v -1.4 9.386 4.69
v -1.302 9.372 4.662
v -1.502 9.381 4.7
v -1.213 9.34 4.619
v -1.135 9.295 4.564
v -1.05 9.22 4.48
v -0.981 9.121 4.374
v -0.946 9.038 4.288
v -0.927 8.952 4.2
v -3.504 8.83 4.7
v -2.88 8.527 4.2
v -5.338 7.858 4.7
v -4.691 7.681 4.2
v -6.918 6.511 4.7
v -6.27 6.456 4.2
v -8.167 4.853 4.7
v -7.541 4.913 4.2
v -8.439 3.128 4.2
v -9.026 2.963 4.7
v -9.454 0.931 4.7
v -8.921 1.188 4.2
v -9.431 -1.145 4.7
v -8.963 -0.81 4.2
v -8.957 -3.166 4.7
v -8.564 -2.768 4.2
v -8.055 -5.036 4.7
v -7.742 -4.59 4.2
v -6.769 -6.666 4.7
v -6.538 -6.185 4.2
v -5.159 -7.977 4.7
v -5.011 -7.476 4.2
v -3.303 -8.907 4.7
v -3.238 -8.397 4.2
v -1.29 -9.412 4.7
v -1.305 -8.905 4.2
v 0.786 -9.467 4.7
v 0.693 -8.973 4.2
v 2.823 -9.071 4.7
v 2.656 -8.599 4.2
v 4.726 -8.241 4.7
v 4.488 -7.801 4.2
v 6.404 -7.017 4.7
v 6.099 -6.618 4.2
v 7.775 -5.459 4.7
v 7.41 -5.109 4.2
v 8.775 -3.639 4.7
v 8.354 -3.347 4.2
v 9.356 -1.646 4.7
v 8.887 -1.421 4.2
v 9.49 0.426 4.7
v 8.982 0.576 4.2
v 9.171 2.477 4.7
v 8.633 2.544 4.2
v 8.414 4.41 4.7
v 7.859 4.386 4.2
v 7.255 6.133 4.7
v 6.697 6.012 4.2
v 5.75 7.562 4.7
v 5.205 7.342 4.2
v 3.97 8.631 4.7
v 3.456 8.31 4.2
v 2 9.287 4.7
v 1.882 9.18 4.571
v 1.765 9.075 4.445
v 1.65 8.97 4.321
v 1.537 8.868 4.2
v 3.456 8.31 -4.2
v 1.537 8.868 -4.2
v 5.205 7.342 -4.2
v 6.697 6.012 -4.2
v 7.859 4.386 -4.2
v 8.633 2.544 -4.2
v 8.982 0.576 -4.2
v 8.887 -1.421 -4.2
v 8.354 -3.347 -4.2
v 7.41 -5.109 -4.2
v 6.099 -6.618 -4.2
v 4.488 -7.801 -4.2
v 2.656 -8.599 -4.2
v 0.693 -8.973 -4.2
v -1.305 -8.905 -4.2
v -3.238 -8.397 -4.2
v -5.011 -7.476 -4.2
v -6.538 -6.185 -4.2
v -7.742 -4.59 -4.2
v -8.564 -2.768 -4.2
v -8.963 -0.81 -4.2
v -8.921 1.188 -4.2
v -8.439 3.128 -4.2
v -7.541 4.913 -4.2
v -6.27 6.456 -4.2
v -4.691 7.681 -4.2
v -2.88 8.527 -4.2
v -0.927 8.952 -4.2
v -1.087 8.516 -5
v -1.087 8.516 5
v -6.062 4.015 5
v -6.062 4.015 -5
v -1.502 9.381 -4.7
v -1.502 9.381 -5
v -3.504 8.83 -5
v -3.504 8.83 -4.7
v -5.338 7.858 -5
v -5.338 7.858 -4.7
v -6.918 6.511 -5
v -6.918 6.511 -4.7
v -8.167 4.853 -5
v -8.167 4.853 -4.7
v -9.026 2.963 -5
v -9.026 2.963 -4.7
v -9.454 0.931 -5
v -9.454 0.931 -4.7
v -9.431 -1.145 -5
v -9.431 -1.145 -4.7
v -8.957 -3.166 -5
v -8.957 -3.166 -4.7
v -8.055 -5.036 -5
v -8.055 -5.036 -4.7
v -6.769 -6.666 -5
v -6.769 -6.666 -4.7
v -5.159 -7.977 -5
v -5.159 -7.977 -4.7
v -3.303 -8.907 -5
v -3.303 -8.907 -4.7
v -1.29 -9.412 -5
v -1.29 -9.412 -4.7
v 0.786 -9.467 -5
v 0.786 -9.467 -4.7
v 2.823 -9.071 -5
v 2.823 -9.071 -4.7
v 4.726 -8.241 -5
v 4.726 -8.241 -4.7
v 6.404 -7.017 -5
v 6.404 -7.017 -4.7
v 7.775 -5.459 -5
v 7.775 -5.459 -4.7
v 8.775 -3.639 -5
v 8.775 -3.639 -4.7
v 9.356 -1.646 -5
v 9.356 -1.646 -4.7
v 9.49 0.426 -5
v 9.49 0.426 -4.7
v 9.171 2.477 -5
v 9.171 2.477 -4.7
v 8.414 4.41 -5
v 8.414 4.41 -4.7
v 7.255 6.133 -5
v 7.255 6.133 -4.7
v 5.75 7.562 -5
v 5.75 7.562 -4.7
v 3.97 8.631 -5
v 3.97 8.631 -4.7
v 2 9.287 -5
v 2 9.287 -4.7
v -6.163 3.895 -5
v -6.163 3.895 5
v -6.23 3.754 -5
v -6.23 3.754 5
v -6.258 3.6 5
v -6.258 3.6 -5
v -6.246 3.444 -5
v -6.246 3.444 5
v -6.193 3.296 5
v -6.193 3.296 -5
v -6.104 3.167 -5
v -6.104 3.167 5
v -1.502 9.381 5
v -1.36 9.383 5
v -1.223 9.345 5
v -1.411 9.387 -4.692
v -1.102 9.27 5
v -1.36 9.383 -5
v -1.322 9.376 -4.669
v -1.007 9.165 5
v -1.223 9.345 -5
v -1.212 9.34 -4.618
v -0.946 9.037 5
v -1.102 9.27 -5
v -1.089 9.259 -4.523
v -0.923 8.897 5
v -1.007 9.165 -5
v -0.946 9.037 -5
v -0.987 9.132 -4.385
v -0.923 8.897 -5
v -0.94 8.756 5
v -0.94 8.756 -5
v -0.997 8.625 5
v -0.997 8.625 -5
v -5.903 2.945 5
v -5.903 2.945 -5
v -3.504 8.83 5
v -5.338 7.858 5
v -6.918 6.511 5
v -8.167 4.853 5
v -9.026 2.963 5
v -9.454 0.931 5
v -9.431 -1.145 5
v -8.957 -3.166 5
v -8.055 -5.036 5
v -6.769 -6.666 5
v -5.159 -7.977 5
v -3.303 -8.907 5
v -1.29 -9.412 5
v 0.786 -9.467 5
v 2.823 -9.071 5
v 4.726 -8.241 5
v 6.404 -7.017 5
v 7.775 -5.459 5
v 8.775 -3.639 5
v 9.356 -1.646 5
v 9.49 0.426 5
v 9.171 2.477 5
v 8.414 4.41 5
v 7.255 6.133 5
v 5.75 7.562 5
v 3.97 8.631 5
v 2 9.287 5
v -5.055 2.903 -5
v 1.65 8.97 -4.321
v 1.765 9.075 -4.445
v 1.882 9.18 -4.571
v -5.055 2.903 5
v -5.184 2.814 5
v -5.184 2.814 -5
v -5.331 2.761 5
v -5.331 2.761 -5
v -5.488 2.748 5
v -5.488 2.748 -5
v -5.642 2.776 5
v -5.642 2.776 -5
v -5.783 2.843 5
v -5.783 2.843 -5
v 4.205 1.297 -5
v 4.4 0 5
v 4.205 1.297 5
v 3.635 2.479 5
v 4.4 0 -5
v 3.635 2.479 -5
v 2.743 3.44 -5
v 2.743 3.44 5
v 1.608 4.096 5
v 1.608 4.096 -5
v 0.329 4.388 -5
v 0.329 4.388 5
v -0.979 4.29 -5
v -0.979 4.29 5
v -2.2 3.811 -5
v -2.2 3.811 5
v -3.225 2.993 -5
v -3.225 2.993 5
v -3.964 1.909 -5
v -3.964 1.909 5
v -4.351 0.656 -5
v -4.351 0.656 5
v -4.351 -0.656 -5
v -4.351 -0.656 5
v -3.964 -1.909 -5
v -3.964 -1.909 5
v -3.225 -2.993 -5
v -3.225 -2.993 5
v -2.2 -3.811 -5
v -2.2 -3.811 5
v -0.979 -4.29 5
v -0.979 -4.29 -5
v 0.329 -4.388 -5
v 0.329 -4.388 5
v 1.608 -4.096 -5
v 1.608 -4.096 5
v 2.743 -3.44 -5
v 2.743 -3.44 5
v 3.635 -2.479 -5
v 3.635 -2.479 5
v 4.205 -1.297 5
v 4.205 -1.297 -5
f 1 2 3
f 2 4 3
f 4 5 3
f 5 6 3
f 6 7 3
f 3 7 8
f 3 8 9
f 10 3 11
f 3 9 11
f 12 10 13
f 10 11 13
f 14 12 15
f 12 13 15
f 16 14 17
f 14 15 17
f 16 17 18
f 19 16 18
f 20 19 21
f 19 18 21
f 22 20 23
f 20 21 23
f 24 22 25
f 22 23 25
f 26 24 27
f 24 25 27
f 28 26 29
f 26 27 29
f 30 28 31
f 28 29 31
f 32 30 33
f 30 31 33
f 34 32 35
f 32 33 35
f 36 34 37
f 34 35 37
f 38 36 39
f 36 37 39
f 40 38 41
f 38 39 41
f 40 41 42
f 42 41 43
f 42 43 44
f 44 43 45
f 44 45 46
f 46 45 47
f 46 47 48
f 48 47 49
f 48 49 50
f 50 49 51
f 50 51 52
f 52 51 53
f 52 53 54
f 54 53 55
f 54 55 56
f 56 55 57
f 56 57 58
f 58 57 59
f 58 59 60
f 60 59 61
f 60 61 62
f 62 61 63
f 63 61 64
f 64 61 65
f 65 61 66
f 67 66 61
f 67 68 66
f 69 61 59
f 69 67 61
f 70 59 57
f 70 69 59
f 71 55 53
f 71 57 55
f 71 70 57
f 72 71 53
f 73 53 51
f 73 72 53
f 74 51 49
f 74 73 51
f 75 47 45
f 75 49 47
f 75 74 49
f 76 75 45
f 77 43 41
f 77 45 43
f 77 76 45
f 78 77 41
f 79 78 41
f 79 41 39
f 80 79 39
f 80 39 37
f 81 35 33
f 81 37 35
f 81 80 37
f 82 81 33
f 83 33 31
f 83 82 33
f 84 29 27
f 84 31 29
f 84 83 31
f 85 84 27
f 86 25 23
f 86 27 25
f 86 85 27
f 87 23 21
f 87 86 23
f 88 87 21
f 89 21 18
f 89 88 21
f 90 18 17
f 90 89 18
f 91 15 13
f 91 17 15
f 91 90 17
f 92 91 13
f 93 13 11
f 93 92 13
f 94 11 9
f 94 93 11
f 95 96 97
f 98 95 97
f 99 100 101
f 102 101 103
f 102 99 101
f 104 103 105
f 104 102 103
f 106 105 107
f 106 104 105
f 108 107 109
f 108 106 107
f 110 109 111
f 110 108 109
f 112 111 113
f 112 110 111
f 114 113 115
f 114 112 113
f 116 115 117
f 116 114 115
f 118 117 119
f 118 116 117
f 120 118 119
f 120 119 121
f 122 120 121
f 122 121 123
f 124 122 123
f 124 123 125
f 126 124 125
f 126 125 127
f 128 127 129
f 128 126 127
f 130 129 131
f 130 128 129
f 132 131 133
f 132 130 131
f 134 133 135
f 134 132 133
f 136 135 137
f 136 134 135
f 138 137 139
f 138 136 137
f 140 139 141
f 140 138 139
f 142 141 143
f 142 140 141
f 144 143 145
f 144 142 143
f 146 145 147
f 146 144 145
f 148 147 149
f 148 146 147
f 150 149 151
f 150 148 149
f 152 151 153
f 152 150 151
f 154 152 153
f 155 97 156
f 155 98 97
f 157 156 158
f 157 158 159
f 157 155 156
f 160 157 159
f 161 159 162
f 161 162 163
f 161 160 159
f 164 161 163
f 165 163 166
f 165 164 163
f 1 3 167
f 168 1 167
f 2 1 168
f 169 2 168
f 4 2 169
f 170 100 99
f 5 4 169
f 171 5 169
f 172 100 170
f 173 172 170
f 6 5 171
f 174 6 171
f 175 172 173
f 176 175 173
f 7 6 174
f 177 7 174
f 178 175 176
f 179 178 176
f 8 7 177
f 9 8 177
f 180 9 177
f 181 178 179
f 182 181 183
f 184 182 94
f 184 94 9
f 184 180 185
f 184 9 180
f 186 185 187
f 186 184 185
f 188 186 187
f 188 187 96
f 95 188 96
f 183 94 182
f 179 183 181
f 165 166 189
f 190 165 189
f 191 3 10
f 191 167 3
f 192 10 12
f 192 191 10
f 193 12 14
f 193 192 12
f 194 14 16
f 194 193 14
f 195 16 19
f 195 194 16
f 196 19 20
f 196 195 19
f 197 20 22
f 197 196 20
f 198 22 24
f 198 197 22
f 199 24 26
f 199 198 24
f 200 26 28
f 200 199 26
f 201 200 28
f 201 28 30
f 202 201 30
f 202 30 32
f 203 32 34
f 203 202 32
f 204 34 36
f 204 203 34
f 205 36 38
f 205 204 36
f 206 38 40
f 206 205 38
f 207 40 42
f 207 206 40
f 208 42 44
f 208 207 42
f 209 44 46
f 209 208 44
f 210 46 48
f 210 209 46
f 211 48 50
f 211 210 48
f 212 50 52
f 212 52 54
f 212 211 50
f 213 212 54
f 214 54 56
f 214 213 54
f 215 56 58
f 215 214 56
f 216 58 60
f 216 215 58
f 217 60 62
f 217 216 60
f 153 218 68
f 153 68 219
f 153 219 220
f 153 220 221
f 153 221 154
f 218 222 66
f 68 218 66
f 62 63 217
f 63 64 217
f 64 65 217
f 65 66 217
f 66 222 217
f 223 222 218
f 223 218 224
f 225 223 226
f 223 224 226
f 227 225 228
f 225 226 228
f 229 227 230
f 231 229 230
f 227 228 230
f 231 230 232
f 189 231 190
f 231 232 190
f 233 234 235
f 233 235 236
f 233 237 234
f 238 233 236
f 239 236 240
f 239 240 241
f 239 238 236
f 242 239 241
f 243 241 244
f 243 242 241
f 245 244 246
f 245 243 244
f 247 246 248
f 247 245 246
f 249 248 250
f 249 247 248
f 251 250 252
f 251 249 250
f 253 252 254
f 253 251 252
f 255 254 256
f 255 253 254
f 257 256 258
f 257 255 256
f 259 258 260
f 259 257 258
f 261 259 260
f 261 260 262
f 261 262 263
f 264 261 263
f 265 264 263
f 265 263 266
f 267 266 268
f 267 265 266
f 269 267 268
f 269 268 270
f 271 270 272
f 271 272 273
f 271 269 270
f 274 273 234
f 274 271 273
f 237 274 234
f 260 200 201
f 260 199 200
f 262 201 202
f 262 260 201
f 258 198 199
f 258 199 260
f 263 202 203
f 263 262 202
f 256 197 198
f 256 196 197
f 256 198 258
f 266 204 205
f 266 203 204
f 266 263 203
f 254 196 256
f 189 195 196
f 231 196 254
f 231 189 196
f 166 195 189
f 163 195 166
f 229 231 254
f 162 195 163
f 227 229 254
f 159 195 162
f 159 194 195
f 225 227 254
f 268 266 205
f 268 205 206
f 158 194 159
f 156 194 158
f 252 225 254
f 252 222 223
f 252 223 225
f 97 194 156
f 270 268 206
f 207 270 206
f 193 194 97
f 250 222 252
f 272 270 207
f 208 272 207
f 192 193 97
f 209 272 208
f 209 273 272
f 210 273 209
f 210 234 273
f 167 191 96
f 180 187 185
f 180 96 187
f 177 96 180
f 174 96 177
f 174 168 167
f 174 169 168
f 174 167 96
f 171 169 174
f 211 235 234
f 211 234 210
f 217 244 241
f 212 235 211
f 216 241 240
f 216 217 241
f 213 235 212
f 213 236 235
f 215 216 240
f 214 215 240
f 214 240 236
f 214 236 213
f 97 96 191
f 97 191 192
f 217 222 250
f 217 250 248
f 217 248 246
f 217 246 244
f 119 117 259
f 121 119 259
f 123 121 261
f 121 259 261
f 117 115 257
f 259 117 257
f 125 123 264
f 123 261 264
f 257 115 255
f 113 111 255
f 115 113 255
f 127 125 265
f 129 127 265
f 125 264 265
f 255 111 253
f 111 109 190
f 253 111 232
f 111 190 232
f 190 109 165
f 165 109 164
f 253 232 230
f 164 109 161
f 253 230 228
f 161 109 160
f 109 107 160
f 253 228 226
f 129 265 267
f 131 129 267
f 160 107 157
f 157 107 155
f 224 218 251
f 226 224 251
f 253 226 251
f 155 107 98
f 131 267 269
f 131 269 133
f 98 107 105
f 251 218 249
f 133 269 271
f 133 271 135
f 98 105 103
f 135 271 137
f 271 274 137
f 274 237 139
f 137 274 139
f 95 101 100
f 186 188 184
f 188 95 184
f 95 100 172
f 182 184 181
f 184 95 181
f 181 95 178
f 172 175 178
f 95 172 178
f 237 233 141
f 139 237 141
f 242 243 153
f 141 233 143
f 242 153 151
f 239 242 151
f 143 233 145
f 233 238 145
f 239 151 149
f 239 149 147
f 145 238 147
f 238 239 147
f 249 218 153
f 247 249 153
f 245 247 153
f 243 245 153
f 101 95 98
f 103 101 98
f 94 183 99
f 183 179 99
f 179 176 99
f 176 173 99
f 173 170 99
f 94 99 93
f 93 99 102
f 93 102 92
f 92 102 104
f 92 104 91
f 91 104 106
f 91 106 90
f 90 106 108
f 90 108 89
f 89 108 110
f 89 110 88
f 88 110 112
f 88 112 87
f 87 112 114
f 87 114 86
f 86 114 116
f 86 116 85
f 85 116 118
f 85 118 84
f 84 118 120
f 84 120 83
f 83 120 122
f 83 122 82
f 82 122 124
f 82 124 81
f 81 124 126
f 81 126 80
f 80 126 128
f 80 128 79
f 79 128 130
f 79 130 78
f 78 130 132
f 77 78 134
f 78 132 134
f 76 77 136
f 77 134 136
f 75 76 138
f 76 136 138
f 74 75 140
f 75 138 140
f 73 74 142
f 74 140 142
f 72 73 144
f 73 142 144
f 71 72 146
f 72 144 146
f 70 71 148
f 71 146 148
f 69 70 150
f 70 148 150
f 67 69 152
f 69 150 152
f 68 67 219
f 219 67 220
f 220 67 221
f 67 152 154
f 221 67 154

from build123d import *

# Parameters (mm, degrees)
SKETCH1_R           = 9.5
SKETCH1_R_2         = 4.4
BOSS_EXTRUDE1_DEPTH = 5
CUT_EXTRUDE1_DEPTH  = 17.748134224444225
SKETCH3_R           = 9.5
SKETCH3_R_2         = 9
CUT_EXTRUDE2_DEPTH  = 4
CHAMFER1_SIZE       = 0.7
FILLET1_R           = 0.5
FILLET2_R           = 0.6


with BuildPart() as part:
    # Sketch1 → Boss-Extrude1 (new, symmetric)
    with BuildSketch(Plane.XY):
        Circle(SKETCH1_R)
        Circle(SKETCH1_R_2, mode=Mode.SUBTRACT)
    extrude(amount=BOSS_EXTRUDE1_DEPTH, both=True)

    # Sketch2 → Cut-Extrude1 (cut, through all)
    with BuildSketch(Plane.XY.offset(5)):
        with BuildLine():
            Line((0, 9.5), (-6.506462158581922, 3.612220267457224))
            Line((-6.506462158581922, 3.612220267457224), (-5.500000000000001, 2.4999999999999996))
            Line((-5.500000000000001, 2.4999999999999996), (2.000217039706271, 9.287041067749655))
            ThreePointArc((2.000217039706271, 9.287041067749655), (1.0057608702813652, 9.446610242399696), (0, 9.5))
        make_face()
    extrude(amount=-CUT_EXTRUDE1_DEPTH, mode=Mode.SUBTRACT)

    # Sketch3 → Cut-Extrude2 (cut, symmetric)
    with BuildSketch(Plane.XY):
        Circle(SKETCH3_R)
        Circle(SKETCH3_R_2, mode=Mode.SUBTRACT)
    extrude(amount=CUT_EXTRUDE2_DEPTH, both=True, mode=Mode.SUBTRACT)

    # Chamfer1
    # the kernel refuses this chamfer: 0.7 mm, written as the material it takes off along each edge
    with BuildSketch(Plane(origin=(0, 0, 4), x_dir=(0.10274511100346817, 0.9947077169525151, 0), z_dir=(0.9947077169525151, -0.10274511100346817, 0))) as chamfer1_piece_1_section:
        Polygon((9.5, CHAMFER1_SIZE), (9.5 - CHAMFER1_SIZE, 0), (9.5, 0), align=None)
    chamfer1_piece_1 = revolve(axis=Axis((0, 0, 4), (0, 0, 1)), revolution_arc=359.64, mode=Mode.PRIVATE)
    chamfer1_piece_1 = chamfer1_piece_1 - Plane(origin=(0, 0, 4.439831857806262), x_dir=(1, 0, 0), z_dir=(0, 0, -1)) * Cylinder(9, 38, mode=Mode.PRIVATE)
    add(chamfer1_piece_1, mode=Mode.SUBTRACT)
    with BuildSketch(Plane(origin=(0, 0, -4), x_dir=(0.10274511100346817, 0.9947077169525151, 0), z_dir=(0.9947077169525151, -0.10274511100346817, 0))) as chamfer1_piece_2_section:
        Polygon((9.5 - CHAMFER1_SIZE, 0), (9.5, -CHAMFER1_SIZE), (9.5, 0), align=None)
    chamfer1_piece_2 = revolve(axis=Axis((0, 0, -4), (0, 0, 1)), revolution_arc=359.64, mode=Mode.PRIVATE)
    chamfer1_piece_2 = chamfer1_piece_2 - Plane(origin=(0, 0, -4.439831857806264), x_dir=(1, 0, 0), z_dir=(0, 0, -1)) * Cylinder(9, 38, mode=Mode.PRIVATE)
    add(chamfer1_piece_2, mode=Mode.SUBTRACT)

    # Fillet1
    fillet1_edges = [part.edges().sort_by_distance(p)[0] for p in [
        (3e-17, 9.5, 4.85),
    ]]
    fillet(fillet1_edges, radius=FILLET1_R)

    # Fillet2
    fillet2_edges = [part.edges().sort_by_distance(p)[0] for p in [
        (-5.500000000000001, 2.4999999999999996, 0),
        (-6.506462158581922, 3.612220267457224, 0),
    ]]
    fillet(fillet2_edges, radius=FILLET2_R)


solid = part.part
